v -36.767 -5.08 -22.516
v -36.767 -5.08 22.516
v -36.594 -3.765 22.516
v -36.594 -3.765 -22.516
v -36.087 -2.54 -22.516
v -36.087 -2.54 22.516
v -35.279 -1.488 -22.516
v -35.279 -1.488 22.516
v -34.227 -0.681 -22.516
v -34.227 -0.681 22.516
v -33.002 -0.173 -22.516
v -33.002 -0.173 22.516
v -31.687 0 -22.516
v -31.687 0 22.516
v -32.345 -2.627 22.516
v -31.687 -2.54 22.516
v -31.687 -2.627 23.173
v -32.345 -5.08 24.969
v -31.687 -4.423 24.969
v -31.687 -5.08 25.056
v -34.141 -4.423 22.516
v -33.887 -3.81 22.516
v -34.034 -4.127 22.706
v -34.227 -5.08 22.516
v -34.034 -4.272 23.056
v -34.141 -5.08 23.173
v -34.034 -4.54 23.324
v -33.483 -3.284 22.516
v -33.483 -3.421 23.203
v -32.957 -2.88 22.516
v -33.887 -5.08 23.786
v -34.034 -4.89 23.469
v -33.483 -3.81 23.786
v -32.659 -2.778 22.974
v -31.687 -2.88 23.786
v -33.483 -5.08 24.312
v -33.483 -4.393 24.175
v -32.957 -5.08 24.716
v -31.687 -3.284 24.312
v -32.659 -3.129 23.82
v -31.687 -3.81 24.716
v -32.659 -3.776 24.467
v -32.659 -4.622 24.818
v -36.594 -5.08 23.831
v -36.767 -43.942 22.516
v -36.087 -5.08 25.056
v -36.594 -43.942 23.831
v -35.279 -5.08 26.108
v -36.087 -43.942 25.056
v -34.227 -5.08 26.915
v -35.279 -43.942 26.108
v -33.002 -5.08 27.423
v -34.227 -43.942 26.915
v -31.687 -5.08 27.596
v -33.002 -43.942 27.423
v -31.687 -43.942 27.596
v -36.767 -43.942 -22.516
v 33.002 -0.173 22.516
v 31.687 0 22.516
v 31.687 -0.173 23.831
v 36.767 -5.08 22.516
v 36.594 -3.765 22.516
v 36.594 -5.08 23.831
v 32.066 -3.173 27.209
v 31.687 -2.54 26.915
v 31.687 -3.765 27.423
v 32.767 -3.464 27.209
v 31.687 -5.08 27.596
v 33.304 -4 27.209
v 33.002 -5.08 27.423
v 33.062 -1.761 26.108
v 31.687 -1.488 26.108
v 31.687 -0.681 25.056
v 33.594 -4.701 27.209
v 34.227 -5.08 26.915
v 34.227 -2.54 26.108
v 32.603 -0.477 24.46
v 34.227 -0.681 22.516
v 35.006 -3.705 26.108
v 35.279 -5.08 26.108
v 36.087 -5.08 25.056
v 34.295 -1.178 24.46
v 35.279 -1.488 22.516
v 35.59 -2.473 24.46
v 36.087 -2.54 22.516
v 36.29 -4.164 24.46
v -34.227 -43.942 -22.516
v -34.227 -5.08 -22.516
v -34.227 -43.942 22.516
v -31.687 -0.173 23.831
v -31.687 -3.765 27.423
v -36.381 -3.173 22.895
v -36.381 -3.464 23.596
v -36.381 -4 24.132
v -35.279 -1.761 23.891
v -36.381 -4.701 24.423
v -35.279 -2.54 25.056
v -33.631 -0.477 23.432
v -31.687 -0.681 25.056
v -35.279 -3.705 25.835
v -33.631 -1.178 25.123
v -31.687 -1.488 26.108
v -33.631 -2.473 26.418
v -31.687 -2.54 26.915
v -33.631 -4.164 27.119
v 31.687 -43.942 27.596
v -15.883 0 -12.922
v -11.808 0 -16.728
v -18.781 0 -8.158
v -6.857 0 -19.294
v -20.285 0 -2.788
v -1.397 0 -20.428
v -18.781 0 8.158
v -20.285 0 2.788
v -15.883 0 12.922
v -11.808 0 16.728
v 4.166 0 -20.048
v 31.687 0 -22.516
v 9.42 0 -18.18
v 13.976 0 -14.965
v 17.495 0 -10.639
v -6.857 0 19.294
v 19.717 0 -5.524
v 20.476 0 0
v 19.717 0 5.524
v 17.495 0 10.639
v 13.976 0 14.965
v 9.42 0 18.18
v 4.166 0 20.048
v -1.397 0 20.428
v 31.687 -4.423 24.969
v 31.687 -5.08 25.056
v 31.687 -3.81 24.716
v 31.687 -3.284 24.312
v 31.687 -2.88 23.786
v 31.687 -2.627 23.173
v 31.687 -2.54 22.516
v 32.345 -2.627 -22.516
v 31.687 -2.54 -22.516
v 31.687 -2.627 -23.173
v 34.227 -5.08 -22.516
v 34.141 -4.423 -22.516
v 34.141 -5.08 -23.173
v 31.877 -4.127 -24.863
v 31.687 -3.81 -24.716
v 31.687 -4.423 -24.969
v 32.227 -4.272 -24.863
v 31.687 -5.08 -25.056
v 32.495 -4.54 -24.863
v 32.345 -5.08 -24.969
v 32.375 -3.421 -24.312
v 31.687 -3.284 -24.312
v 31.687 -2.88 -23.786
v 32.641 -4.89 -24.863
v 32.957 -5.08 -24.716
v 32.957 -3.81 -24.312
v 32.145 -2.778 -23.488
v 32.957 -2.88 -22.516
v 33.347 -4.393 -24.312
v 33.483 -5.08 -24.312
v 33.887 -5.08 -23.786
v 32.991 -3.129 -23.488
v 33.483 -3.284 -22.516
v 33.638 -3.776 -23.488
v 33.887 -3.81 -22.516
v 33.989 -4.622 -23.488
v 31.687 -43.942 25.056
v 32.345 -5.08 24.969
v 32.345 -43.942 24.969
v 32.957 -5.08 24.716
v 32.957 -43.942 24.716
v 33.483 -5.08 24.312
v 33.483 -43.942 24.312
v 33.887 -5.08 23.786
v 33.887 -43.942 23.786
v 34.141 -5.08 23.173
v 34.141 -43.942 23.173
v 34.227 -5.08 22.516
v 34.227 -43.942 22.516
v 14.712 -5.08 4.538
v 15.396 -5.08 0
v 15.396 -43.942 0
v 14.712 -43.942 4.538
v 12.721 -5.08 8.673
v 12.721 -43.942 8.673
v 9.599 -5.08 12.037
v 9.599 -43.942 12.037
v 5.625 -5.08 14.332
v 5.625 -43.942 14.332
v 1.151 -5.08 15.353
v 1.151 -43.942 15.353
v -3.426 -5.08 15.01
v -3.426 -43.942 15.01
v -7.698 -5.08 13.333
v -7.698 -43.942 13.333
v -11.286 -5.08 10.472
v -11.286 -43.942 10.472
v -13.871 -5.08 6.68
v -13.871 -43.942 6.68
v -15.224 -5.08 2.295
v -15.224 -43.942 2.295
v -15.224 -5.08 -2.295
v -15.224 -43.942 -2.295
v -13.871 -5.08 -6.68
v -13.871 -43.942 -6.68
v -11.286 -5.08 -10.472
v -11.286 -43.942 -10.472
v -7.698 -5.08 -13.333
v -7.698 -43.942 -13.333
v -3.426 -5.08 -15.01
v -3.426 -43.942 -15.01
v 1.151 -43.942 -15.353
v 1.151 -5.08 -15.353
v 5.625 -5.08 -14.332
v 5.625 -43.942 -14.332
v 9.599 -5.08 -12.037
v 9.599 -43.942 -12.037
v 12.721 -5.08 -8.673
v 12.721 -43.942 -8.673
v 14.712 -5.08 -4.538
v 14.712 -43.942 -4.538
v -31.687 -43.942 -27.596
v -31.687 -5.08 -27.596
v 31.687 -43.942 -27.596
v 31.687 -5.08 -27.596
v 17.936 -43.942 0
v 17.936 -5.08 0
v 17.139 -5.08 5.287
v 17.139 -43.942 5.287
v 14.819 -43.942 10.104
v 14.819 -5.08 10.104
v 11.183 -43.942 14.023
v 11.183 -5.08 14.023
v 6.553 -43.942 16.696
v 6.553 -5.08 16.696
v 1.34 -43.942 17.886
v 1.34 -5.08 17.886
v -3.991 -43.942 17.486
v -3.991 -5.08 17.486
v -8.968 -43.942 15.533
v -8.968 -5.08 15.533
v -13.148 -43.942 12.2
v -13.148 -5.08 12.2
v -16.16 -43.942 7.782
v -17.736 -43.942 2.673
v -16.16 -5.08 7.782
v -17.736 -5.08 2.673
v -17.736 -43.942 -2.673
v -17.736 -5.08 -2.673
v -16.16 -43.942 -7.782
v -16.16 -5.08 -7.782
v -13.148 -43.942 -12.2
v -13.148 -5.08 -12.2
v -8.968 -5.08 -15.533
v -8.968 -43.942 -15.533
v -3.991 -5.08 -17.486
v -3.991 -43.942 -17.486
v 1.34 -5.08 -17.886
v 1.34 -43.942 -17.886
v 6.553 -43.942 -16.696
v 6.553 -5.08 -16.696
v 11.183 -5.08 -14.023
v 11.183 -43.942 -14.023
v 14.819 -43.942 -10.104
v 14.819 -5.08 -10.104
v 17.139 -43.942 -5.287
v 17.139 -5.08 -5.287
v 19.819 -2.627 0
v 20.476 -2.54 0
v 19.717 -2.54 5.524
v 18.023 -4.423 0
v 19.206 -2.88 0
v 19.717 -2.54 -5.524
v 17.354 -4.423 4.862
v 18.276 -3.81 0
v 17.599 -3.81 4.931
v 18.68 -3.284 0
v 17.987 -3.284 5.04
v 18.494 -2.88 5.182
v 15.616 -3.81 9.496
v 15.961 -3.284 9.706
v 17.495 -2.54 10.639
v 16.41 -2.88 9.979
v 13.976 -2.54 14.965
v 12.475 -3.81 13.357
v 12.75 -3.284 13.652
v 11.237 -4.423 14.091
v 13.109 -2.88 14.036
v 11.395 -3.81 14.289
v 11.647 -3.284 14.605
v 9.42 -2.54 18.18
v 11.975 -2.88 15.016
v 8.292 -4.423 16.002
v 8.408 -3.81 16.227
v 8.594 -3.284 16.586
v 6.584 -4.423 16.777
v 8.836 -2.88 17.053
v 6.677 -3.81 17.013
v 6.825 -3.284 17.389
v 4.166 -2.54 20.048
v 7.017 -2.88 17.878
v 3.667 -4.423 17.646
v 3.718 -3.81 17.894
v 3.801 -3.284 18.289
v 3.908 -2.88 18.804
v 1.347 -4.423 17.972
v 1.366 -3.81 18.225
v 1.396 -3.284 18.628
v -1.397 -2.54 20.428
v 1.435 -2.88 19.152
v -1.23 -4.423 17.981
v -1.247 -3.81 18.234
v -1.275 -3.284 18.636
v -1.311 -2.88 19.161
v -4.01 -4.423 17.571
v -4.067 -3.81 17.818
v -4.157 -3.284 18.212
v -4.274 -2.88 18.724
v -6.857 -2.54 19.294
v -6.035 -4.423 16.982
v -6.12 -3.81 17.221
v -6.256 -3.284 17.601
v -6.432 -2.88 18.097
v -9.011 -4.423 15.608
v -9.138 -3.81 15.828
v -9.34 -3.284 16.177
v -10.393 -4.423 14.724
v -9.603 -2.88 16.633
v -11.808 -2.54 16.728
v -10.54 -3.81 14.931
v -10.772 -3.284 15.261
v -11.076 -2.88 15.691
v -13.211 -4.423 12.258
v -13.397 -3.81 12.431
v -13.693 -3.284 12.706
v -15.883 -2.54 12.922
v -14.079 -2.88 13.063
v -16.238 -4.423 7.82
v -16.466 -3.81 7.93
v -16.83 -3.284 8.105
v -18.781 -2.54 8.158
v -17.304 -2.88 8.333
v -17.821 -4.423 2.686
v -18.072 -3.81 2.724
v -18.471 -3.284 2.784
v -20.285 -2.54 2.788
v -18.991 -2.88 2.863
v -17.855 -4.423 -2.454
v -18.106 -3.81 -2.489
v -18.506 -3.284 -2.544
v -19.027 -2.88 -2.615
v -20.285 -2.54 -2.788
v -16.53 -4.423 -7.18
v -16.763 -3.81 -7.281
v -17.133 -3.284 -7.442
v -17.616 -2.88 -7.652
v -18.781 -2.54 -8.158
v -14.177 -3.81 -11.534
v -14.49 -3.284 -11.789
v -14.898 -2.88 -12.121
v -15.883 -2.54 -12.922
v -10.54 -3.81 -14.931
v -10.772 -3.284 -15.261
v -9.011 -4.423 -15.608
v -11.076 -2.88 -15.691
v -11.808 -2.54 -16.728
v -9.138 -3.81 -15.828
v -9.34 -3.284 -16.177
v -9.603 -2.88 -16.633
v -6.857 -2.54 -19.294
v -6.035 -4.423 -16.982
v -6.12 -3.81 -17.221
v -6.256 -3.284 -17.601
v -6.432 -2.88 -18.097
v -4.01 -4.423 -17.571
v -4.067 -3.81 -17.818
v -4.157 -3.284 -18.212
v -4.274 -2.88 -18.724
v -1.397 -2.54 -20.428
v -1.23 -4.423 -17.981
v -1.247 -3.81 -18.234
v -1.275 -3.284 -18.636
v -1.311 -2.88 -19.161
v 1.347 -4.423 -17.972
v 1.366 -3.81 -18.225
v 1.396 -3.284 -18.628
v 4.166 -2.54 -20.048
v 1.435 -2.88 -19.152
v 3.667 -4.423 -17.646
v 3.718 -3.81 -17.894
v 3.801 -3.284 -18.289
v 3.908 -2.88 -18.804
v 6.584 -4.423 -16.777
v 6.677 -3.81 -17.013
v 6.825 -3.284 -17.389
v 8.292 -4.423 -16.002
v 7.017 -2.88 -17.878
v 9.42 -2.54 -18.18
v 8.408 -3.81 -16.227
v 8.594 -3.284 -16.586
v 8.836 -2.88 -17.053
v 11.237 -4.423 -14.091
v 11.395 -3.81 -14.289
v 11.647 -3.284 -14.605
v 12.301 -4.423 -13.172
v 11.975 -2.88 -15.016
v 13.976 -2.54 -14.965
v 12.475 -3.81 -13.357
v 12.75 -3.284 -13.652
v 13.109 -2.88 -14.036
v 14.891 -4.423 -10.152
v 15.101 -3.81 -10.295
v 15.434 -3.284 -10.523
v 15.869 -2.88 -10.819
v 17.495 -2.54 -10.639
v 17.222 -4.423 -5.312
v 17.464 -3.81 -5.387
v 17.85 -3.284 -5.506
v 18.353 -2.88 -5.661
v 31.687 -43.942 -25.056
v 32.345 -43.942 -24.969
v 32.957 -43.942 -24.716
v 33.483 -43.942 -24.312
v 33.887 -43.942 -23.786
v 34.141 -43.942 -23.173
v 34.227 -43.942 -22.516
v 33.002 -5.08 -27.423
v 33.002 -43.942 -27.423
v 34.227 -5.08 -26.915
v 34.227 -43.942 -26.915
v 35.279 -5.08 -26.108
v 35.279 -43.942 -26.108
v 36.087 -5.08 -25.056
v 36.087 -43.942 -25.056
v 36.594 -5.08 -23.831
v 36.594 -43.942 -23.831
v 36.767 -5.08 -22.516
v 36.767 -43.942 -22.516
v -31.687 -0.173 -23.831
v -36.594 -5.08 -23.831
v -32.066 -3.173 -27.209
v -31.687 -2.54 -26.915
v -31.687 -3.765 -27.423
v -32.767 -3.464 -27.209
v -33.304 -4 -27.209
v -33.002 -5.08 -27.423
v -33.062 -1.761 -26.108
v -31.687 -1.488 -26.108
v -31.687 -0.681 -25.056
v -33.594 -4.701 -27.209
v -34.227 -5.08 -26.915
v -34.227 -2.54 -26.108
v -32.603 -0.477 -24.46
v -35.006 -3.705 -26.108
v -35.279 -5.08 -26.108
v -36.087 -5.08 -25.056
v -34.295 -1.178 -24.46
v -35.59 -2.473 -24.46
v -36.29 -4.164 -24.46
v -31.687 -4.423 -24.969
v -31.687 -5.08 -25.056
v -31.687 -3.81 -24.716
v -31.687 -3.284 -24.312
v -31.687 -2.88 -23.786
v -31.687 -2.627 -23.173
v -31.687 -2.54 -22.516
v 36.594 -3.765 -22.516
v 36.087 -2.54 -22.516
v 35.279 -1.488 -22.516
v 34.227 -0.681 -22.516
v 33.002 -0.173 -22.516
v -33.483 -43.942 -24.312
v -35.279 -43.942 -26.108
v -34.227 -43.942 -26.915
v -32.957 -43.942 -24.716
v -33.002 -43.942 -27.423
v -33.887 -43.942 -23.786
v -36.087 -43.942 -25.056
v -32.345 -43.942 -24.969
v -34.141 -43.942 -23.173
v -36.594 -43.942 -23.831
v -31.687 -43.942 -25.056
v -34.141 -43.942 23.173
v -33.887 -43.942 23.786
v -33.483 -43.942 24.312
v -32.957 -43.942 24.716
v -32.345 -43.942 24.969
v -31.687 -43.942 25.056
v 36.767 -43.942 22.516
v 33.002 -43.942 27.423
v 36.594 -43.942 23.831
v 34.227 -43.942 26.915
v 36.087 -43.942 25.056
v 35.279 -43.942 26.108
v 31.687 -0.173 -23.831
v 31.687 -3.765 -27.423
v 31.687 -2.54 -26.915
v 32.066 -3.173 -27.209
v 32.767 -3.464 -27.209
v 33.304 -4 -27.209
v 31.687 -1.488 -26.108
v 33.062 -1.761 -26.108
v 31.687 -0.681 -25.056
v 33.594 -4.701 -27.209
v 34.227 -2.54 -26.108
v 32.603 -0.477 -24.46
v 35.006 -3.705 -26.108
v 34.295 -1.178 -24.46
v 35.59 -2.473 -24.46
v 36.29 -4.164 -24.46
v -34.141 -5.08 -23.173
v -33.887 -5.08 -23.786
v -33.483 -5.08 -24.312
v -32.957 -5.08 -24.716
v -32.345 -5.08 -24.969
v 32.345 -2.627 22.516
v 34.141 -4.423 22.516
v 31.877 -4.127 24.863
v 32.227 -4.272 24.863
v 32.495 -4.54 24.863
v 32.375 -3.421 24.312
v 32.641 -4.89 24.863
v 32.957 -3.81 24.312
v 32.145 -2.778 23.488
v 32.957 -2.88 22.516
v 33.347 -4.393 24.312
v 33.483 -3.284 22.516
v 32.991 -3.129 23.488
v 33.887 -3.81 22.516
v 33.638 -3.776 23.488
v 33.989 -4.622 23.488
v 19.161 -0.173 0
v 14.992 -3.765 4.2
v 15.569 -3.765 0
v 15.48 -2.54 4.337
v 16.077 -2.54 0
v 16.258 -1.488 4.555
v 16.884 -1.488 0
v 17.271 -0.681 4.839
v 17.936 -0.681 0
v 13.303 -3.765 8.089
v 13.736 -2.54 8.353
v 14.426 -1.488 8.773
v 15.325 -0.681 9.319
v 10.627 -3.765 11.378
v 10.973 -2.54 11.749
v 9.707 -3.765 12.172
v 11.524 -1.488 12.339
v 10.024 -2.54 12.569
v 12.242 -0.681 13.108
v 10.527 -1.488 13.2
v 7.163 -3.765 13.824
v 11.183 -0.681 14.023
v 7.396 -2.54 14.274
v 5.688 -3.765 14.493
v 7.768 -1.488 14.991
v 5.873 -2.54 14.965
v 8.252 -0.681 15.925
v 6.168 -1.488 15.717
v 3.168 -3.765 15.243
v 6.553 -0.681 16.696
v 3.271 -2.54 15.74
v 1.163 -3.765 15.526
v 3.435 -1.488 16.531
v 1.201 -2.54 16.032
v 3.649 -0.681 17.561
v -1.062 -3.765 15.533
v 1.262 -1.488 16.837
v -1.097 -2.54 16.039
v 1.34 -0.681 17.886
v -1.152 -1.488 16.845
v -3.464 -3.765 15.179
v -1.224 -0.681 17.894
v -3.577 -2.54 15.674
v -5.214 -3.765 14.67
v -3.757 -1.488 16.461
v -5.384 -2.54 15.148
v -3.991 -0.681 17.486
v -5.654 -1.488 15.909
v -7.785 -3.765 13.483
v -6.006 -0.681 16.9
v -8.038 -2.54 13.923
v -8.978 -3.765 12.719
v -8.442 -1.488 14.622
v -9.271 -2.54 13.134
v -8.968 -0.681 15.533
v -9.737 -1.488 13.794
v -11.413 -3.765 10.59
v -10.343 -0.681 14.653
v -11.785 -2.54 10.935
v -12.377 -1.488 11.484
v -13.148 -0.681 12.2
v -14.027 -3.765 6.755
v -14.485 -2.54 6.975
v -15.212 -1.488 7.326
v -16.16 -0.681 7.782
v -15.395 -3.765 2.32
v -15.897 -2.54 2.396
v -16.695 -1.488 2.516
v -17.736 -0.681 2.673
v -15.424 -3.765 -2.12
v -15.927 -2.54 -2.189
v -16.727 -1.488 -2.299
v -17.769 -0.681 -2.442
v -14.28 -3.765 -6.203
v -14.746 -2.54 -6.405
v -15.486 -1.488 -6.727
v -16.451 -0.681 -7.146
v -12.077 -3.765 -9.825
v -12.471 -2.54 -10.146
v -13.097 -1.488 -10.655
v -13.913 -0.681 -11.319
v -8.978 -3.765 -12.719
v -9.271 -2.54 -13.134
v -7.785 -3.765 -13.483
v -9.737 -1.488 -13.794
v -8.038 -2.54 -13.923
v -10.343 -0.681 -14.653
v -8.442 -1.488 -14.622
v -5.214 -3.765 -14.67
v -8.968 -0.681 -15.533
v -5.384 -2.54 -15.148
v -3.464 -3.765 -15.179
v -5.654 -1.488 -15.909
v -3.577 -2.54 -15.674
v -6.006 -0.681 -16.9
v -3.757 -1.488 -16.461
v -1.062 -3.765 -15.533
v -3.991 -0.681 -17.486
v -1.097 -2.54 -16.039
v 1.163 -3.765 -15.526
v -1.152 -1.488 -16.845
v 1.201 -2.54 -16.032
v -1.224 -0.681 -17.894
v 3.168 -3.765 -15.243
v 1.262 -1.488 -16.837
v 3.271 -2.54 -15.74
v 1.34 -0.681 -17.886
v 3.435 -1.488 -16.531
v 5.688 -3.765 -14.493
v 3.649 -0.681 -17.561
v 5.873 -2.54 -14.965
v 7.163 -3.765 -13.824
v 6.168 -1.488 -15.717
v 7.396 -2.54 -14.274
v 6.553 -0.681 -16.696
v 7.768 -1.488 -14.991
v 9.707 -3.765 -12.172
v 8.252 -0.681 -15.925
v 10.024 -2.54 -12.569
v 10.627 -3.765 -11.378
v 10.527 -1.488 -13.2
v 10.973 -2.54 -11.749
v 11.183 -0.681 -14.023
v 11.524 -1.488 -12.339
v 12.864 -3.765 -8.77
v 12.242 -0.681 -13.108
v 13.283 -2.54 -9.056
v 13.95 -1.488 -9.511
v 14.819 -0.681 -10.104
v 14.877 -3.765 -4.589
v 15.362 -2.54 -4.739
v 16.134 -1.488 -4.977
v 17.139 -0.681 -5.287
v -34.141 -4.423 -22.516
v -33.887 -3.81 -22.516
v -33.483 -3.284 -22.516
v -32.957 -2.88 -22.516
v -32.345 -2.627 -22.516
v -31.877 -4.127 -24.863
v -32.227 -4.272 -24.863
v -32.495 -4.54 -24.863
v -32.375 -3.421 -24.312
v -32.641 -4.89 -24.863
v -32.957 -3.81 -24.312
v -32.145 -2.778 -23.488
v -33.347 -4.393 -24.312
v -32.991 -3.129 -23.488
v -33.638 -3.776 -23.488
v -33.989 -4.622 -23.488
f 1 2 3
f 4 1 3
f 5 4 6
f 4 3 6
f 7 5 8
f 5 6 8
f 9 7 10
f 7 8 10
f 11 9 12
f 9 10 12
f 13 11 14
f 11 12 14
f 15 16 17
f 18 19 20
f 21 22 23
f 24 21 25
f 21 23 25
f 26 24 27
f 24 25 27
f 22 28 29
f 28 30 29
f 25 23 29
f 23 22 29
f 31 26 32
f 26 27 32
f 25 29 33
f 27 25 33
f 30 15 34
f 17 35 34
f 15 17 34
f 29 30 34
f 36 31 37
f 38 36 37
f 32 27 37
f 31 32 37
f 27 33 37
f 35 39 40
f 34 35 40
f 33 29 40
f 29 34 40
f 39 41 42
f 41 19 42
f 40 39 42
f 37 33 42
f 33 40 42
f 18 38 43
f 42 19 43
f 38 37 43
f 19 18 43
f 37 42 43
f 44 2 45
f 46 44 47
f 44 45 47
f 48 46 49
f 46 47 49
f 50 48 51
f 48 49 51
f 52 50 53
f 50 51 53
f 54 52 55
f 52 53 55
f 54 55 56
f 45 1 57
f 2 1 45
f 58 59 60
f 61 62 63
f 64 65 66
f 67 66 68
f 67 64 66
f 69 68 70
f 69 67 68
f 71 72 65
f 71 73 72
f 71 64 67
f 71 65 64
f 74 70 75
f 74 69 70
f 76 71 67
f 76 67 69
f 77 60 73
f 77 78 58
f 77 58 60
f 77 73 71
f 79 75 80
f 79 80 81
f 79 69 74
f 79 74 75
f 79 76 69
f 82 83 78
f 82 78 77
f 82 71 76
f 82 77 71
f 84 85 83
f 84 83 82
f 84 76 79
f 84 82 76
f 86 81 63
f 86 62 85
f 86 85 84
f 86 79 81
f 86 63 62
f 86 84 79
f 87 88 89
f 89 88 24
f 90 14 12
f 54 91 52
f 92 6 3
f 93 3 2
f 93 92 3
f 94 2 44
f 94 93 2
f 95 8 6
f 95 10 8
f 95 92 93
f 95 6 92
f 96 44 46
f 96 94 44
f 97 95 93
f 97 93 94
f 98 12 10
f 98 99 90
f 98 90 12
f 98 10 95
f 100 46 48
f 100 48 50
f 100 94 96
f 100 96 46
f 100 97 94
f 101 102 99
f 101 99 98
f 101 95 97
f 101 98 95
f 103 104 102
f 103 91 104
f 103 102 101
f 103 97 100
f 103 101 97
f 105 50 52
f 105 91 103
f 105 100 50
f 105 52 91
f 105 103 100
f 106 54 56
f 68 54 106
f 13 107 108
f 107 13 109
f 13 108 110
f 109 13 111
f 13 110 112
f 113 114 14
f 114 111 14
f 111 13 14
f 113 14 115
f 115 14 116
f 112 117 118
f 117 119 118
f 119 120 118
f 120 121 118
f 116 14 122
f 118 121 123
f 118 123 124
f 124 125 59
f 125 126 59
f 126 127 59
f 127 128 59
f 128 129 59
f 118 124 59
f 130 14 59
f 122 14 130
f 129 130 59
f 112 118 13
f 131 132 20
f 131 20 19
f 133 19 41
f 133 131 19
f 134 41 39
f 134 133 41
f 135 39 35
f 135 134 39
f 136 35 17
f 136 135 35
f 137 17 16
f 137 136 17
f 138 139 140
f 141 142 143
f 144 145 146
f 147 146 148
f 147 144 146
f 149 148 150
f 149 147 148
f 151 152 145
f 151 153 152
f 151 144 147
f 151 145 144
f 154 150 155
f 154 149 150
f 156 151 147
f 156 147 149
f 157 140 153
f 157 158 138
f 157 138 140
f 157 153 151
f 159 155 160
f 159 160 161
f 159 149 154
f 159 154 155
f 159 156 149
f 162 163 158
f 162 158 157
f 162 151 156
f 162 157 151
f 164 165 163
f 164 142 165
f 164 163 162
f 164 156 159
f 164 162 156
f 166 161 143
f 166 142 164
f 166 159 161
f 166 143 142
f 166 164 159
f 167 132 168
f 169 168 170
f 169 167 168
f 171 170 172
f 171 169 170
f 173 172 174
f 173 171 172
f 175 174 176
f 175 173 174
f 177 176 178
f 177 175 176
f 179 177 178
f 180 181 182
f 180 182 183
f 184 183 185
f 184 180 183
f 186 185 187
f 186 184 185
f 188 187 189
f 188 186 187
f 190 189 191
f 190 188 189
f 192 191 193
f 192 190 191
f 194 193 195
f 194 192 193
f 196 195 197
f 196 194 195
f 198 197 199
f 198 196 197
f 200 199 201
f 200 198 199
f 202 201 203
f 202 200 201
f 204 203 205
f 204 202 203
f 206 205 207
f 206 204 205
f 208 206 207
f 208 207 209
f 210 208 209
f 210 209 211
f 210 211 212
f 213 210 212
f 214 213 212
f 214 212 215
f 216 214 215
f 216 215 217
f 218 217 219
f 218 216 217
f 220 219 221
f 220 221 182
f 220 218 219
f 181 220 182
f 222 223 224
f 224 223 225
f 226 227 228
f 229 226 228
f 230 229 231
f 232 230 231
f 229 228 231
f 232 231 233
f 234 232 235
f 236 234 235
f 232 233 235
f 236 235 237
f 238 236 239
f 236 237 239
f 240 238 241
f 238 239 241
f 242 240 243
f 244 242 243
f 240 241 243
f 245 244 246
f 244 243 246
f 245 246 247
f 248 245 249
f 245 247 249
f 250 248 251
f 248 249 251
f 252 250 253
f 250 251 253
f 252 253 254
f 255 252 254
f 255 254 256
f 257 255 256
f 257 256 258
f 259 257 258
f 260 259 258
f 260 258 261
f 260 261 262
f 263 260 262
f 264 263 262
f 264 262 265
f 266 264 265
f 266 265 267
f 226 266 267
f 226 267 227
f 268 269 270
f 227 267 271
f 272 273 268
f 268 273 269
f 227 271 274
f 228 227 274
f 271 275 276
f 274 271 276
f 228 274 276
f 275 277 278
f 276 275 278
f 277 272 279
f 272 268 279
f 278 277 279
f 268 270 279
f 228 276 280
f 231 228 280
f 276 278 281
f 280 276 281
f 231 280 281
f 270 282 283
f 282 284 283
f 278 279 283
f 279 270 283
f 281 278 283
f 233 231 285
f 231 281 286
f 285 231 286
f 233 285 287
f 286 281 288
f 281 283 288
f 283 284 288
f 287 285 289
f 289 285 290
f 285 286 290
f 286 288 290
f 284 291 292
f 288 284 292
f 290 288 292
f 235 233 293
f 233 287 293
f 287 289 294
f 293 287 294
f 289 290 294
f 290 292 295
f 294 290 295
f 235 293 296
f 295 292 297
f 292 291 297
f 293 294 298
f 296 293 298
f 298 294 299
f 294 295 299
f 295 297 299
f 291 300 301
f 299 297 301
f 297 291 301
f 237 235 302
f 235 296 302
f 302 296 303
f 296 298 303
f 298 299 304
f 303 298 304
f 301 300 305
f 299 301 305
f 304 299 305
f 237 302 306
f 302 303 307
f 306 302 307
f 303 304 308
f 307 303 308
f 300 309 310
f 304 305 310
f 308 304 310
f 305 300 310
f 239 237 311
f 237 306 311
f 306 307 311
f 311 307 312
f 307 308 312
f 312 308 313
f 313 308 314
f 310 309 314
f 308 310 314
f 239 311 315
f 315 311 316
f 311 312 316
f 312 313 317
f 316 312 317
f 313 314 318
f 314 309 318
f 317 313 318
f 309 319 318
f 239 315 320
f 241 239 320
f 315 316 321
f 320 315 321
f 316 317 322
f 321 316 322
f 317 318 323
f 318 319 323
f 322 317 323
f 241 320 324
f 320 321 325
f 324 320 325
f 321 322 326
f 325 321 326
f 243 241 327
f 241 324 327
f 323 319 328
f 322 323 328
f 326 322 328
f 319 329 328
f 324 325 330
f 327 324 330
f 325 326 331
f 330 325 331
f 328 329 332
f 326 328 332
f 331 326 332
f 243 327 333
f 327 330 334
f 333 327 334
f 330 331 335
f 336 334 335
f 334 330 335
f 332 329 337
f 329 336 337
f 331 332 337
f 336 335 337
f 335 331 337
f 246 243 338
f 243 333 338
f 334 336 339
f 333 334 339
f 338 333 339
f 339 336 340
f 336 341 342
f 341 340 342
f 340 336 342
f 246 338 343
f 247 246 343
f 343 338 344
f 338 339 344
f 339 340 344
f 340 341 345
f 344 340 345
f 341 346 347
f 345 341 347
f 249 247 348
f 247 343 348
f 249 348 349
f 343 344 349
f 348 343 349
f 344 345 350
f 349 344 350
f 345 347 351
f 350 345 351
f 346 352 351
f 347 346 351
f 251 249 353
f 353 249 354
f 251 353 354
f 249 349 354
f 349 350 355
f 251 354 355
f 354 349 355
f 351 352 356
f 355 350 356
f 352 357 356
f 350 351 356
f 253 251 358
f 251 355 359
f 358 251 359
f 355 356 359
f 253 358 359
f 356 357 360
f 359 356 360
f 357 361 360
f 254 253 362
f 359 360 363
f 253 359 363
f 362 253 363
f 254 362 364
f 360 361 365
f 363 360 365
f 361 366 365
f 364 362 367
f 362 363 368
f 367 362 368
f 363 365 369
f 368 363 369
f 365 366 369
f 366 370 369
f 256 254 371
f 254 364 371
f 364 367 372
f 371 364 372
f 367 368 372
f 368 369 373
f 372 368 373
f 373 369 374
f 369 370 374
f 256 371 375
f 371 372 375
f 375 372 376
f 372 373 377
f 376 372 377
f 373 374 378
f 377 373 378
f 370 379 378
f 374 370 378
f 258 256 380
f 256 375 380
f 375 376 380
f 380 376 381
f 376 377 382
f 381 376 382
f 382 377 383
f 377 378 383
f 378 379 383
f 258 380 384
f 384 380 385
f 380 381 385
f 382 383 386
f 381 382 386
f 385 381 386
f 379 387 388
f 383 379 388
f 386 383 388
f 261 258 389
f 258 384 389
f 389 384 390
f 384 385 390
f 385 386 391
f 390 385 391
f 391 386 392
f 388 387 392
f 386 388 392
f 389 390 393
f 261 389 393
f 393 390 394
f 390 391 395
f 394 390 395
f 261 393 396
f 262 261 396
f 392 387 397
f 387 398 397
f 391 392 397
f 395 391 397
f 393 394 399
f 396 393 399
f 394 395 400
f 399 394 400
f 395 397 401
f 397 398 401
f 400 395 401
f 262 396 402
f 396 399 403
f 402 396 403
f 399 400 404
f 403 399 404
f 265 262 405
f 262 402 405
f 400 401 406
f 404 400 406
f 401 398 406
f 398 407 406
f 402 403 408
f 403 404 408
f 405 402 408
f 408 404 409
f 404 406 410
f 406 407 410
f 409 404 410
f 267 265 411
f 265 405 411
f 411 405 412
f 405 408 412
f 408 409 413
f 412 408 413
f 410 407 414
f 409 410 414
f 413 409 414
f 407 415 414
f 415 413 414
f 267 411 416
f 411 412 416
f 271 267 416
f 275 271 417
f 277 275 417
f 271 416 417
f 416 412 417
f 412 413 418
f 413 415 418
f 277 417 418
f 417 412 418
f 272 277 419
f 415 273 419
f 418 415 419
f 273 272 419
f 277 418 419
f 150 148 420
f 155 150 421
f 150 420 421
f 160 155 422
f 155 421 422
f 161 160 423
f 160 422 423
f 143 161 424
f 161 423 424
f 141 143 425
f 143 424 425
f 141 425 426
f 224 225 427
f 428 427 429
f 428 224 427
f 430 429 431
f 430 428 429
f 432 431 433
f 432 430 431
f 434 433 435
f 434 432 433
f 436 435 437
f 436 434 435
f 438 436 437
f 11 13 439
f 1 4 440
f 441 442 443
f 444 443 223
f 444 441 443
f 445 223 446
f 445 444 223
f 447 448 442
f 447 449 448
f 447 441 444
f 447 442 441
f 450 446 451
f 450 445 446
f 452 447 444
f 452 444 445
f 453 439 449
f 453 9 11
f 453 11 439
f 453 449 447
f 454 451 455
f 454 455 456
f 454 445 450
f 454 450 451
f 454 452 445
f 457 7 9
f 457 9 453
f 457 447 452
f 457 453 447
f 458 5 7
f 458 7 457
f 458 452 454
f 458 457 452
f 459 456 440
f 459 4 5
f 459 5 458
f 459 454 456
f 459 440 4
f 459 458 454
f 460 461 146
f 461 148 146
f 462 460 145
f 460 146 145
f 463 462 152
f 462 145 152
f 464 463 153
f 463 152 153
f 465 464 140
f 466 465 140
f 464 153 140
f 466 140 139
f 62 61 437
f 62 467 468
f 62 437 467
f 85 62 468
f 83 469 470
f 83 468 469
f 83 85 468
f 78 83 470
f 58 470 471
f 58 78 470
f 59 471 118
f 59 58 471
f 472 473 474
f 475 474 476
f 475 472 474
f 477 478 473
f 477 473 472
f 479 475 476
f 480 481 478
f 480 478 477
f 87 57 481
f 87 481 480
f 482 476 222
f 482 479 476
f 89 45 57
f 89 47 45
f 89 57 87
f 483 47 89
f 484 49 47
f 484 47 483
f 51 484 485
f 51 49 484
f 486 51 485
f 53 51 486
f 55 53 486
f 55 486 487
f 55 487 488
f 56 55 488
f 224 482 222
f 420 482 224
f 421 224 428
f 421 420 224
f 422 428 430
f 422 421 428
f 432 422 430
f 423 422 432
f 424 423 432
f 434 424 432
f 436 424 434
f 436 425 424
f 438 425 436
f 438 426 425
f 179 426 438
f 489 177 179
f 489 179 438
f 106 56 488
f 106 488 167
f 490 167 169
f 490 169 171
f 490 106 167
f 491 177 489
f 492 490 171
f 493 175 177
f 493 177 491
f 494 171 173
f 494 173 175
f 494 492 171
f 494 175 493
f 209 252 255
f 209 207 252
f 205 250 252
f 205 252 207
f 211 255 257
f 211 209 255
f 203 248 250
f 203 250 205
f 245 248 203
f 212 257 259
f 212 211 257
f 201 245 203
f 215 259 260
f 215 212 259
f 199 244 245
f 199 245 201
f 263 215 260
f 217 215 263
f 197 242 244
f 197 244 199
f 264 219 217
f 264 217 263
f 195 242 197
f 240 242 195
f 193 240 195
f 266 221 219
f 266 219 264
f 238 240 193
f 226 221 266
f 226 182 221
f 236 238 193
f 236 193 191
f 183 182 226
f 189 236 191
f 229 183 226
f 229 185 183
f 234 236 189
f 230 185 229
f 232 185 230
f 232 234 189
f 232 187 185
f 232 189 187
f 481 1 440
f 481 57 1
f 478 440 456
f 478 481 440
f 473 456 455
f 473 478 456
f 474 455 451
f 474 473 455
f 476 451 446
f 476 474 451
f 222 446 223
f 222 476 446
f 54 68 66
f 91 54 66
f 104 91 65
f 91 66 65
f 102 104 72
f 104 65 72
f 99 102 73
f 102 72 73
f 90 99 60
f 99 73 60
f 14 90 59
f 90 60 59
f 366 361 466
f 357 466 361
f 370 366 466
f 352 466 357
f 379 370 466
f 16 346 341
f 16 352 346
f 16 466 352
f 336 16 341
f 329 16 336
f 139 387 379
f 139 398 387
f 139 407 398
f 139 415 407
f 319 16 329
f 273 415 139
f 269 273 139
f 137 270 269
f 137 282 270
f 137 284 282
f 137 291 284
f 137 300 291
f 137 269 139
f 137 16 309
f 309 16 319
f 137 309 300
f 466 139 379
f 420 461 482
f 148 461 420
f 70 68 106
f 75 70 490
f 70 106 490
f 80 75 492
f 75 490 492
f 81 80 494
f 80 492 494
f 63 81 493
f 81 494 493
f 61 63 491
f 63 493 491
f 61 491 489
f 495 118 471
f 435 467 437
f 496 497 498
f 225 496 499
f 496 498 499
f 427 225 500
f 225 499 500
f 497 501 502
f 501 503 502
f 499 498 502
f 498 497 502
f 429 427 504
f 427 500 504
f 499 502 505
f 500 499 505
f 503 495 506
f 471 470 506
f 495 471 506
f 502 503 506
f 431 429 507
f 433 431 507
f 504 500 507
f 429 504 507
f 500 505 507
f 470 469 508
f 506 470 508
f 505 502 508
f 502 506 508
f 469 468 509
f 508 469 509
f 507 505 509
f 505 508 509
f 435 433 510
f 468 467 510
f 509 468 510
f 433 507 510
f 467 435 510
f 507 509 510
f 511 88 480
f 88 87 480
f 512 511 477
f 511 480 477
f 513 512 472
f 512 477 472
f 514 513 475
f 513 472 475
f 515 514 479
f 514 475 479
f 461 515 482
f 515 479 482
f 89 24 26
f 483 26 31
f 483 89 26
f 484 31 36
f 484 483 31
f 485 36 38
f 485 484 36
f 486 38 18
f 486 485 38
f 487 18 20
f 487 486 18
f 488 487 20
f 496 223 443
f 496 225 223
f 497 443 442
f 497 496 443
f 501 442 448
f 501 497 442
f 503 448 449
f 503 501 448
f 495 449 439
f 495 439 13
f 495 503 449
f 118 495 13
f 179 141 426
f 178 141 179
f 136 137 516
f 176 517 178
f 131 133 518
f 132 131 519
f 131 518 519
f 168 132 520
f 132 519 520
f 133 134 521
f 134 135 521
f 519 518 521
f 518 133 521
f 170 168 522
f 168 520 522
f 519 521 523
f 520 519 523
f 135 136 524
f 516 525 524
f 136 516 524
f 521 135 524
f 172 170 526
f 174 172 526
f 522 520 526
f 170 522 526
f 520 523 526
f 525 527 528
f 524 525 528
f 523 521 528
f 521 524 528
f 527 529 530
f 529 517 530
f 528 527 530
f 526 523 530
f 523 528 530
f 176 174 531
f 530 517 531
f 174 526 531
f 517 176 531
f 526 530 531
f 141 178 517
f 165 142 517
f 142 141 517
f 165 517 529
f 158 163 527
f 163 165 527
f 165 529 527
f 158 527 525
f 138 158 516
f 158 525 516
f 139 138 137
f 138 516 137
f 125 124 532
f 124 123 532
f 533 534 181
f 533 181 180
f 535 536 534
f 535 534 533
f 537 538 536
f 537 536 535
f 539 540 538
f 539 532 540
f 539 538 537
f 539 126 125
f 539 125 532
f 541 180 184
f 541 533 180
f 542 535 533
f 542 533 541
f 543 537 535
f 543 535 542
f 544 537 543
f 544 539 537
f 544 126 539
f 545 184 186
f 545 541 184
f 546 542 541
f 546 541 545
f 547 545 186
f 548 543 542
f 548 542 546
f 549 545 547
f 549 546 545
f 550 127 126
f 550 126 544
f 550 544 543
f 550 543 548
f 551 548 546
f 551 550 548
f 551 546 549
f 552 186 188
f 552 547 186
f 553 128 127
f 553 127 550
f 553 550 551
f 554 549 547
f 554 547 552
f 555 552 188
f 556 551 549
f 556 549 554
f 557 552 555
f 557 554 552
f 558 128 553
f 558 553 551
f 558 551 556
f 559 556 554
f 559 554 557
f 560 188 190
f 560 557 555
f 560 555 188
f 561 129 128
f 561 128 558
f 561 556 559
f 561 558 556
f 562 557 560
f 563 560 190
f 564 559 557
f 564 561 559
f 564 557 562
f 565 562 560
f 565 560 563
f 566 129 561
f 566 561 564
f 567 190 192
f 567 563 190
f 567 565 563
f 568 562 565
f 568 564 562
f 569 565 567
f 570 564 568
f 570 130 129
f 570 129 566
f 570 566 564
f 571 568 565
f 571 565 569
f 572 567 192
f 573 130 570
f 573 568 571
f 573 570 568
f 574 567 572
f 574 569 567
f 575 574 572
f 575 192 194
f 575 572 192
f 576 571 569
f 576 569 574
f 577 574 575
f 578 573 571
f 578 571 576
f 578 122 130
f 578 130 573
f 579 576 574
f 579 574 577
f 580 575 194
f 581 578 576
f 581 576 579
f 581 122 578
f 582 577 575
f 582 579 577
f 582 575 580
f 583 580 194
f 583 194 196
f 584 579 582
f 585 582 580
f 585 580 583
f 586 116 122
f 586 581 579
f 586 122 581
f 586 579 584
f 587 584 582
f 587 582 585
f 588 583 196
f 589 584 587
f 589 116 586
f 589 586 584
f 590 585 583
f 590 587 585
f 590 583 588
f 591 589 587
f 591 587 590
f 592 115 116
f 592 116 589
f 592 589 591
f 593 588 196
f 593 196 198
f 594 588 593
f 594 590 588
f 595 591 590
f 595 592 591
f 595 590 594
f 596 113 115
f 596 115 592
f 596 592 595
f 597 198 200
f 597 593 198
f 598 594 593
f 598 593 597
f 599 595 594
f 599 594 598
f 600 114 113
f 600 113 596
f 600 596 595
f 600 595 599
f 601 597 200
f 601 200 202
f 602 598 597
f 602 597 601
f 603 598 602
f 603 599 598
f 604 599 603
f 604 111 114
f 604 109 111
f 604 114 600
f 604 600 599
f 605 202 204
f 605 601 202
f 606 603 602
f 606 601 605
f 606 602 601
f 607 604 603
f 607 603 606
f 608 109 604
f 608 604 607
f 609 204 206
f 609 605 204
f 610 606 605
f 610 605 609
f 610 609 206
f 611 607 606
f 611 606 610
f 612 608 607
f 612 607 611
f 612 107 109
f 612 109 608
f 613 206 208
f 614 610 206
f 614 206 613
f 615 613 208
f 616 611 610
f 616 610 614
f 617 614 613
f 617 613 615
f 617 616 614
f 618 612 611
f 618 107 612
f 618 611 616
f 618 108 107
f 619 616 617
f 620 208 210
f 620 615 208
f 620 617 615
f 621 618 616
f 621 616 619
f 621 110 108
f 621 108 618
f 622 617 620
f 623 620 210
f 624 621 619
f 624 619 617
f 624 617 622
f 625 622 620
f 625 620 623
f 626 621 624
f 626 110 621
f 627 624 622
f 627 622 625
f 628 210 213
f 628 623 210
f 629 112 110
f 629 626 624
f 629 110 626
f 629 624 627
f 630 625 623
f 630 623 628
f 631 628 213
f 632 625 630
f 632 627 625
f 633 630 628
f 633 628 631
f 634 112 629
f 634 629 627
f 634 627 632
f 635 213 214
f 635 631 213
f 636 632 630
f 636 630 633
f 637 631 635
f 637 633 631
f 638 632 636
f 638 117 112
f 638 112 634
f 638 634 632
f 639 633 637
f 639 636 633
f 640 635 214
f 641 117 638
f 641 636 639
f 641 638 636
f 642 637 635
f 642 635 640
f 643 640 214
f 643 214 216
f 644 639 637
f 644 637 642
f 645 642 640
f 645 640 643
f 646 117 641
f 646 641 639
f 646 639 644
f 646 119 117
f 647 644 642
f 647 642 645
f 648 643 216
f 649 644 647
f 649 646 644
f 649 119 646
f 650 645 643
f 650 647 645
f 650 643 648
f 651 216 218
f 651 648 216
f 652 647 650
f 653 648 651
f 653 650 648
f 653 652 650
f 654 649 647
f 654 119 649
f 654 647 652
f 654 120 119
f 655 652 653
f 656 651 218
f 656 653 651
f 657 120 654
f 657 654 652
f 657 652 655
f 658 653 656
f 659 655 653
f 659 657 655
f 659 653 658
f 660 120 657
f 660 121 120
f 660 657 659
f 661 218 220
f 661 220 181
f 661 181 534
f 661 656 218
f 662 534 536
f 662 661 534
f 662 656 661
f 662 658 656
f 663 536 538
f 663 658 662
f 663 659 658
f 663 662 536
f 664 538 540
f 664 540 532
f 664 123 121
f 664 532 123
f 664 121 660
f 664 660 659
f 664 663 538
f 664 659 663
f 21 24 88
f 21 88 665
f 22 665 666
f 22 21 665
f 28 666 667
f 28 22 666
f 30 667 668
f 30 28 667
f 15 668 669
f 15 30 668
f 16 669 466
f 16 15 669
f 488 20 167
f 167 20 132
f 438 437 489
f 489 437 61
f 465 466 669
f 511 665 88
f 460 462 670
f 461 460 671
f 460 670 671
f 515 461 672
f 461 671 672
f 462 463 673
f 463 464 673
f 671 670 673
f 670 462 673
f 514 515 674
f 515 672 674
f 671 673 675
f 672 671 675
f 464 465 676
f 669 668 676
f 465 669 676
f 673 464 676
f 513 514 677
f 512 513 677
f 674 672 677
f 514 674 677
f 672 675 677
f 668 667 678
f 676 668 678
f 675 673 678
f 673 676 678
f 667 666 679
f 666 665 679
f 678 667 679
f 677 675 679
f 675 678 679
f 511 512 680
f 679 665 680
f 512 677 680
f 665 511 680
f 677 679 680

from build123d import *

# Parameters (mm, degrees)
F0_W     = 73.534466
F0_H     = 55.191916
F0_R     = 15.396007
F1_DEPTH = 43.942
F2_R     = 5.08
F3_T     = -2.54


with BuildPart() as f1:
    # F0 (on Front) → F1 (new body)
    with BuildSketch(Plane.XZ):
        Rectangle(F0_W, F0_H)
        Circle(F0_R, mode=Mode.SUBTRACT)
    extrude(amount=F1_DEPTH)

    # F2
    f2_edges = [f1.edges().sort_by_distance(p)[0] for p in [
        (36.767233, 0, 0),
        (0, 0, 27.595958),
        (-36.767233, 0, 0),
        (0, 0, -27.595958),
        (-15.396007, 0, 0),
        (-36.767233, -21.971, -27.595958),
        (36.767233, -21.971, -27.595958),
        (36.767233, -21.971, 27.595958),
        (-36.767233, -21.971, 27.595958),
    ]]
    fillet(f2_edges, radius=F2_R)

    # F3
    f3_openings = [f1.faces().sort_by_distance(p)[0] for p in [
        (35.847806, -43.942, 0),
    ]]
    offset(amount=F3_T, openings=f3_openings)


solid = f1.part
